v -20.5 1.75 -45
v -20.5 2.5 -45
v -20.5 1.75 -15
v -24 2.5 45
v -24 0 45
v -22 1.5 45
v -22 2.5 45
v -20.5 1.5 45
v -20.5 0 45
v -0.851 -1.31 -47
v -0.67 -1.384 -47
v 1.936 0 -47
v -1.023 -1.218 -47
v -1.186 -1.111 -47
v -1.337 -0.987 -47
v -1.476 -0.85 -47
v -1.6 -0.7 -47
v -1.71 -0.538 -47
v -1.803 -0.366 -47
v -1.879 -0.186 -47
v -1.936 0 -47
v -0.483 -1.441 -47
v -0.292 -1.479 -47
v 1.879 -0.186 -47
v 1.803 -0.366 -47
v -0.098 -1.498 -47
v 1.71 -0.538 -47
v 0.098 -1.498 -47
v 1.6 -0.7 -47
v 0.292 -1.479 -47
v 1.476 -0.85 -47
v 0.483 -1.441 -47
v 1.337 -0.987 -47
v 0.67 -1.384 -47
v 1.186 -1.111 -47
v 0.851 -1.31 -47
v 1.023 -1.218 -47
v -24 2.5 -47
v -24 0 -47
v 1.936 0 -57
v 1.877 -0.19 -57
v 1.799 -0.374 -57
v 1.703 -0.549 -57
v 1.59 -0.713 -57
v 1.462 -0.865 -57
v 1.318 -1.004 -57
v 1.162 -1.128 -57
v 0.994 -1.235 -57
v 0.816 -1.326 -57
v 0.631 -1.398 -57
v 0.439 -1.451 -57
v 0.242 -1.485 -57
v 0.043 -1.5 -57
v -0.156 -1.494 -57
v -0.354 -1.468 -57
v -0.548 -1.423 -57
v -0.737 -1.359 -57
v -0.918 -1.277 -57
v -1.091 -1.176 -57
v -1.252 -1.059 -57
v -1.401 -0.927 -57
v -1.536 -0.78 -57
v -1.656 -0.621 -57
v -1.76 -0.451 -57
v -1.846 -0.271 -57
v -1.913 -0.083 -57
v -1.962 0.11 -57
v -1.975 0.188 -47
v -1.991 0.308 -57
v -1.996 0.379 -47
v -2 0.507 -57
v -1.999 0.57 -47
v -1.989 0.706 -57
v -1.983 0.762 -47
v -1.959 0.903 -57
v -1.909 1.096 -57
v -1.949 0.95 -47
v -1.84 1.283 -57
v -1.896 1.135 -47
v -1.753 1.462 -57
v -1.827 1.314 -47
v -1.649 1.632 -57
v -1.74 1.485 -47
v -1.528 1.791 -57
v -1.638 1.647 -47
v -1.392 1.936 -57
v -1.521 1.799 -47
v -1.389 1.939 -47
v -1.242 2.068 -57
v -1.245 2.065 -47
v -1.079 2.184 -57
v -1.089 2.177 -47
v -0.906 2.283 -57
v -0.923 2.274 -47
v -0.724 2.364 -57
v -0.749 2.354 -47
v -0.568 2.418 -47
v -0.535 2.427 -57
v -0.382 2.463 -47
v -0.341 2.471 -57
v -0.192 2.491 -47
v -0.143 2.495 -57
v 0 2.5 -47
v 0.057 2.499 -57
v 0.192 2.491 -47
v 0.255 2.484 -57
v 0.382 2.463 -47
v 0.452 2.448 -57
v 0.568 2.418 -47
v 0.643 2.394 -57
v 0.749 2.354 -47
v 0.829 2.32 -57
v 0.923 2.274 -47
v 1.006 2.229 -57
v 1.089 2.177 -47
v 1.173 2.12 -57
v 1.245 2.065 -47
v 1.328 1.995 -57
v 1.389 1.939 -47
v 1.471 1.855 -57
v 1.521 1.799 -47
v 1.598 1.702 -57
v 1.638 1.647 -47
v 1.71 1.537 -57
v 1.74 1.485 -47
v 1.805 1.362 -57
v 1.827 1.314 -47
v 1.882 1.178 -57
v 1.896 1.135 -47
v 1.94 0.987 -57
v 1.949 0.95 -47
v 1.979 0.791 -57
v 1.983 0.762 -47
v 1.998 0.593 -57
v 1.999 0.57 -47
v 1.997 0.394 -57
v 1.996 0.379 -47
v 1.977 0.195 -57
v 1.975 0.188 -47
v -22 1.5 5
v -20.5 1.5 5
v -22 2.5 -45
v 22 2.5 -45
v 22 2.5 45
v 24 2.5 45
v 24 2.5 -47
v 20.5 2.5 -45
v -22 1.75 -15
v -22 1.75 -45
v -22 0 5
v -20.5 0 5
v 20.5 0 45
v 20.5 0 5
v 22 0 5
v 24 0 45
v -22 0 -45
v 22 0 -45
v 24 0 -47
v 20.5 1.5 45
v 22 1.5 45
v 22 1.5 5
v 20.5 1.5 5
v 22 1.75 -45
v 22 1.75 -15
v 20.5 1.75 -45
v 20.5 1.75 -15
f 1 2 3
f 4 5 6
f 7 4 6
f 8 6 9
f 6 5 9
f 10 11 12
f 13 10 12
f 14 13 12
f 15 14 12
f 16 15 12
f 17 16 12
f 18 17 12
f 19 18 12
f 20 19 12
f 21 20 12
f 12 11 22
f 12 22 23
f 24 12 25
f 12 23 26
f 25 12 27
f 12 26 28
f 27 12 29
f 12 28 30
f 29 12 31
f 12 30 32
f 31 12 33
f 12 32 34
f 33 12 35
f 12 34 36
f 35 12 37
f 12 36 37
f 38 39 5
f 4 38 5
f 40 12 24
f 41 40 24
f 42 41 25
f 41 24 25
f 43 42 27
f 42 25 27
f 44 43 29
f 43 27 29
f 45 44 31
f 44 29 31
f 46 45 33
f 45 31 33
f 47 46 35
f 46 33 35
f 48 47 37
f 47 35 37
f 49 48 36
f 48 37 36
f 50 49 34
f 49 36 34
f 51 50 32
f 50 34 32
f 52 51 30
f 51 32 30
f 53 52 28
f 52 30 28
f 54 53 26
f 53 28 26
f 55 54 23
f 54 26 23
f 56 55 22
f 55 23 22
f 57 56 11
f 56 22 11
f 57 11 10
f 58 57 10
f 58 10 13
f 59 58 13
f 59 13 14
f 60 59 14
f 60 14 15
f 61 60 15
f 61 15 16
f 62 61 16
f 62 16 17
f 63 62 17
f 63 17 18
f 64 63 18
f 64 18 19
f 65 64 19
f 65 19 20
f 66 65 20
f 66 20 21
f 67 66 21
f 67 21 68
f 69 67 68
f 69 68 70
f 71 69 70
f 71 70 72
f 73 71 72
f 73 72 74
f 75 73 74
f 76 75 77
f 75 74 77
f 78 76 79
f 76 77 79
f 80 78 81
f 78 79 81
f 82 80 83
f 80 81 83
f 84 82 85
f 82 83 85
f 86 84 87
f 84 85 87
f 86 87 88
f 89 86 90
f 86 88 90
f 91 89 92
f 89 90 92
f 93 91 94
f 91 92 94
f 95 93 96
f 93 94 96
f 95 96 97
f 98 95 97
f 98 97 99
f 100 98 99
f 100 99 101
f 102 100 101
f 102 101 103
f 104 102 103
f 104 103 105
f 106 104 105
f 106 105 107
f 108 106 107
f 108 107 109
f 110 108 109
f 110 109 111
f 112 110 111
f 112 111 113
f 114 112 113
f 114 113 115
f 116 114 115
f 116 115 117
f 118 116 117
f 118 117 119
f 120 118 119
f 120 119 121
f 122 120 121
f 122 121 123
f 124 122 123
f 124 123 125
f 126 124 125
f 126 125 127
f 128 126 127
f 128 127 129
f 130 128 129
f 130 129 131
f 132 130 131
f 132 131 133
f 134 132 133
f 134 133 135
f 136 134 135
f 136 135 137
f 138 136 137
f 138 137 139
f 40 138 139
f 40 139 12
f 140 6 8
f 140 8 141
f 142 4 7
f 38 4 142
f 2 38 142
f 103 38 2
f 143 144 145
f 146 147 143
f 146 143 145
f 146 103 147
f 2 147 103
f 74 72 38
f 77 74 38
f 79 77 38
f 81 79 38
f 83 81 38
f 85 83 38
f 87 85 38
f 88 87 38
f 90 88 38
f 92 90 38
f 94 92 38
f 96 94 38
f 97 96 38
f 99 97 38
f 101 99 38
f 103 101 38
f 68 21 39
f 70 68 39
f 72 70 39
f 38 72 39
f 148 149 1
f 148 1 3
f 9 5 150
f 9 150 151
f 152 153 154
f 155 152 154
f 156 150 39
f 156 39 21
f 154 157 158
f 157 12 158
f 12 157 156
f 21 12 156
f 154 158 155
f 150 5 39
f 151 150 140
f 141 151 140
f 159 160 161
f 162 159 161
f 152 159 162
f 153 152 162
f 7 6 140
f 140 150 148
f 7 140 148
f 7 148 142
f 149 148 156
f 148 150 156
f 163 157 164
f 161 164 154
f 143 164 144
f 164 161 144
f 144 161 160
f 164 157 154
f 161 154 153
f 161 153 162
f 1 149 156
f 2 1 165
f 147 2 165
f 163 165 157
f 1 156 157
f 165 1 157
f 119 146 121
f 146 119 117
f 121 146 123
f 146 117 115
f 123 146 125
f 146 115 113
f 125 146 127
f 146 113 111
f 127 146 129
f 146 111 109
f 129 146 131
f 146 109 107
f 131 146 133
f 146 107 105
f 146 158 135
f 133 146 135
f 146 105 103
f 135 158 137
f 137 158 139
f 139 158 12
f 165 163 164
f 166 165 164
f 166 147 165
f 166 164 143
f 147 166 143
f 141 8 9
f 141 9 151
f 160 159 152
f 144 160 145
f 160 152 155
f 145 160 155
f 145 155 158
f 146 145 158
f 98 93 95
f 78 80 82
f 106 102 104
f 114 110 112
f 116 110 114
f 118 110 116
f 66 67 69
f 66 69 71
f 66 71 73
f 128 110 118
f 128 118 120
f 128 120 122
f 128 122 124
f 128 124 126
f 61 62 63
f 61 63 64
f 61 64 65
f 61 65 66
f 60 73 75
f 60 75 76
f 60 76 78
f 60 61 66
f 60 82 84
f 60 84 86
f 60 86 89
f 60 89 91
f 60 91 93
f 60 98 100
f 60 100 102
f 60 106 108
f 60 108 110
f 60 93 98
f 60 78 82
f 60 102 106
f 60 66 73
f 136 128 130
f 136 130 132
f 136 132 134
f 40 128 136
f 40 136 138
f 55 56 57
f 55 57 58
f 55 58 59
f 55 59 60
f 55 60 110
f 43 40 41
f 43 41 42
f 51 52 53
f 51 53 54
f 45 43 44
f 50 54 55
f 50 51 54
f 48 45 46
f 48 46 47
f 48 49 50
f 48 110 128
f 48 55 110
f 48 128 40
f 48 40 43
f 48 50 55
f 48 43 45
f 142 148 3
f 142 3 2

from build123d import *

# Parameters (mm, degrees)
BOSS_EXTRUDE1_DEPTH = 2.5
SKETCH4_W           = 40
SKETCH4_H           = 1.5
BOSS_EXTRUDE3_DEPTH = 1.5
SKETCH6_R           = 2
BOSS_EXTRUDE4_DEPTH = 10


with BuildPart() as part:
    # Sketch2 → Boss-Extrude1 (new body)
    with BuildSketch(Plane(origin=(0, 0, 0), x_dir=(1, 0, 0), z_dir=(0, 1, 0))):
        Polygon((-22, -45), (-22, 45), (22, 45), (22, -45), (24, -45), (24, 47), (-24, 47), (-24, -45), align=None)
    extrude(amount=BOSS_EXTRUDE1_DEPTH)

    # Sketch4 → Boss-Extrude3 (add)
    with BuildSketch(Plane(origin=(-22, 0, 0), x_dir=(0, 0, -1), z_dir=(1, 0, 0))):
        Polygon((45, 1.75), (15, 1.75), (45, 2.5), align=None)
        with Locations((-25, 0.75)):
            Rectangle(SKETCH4_W, SKETCH4_H)
    boss_extrude3 = extrude(amount=BOSS_EXTRUDE3_DEPTH)

    # Mirror1: Boss-Extrude3 across plane
    add(boss_extrude3.mirror(Plane(origin=(0, 0, 0), x_dir=(0, 0, 1), z_dir=(1, 0, 0))))

    # Sketch6 → Boss-Extrude4 (add)
    with BuildSketch(Plane(origin=(0, 0, -47), x_dir=(-1, 0, 0), z_dir=(0, 0, -1))):
        with Locations(Location((0, 0.5, 0), (0, 0, 194.477512186))):
            Circle(SKETCH6_R)
    extrude(amount=BOSS_EXTRUDE4_DEPTH)


solid = part.part
